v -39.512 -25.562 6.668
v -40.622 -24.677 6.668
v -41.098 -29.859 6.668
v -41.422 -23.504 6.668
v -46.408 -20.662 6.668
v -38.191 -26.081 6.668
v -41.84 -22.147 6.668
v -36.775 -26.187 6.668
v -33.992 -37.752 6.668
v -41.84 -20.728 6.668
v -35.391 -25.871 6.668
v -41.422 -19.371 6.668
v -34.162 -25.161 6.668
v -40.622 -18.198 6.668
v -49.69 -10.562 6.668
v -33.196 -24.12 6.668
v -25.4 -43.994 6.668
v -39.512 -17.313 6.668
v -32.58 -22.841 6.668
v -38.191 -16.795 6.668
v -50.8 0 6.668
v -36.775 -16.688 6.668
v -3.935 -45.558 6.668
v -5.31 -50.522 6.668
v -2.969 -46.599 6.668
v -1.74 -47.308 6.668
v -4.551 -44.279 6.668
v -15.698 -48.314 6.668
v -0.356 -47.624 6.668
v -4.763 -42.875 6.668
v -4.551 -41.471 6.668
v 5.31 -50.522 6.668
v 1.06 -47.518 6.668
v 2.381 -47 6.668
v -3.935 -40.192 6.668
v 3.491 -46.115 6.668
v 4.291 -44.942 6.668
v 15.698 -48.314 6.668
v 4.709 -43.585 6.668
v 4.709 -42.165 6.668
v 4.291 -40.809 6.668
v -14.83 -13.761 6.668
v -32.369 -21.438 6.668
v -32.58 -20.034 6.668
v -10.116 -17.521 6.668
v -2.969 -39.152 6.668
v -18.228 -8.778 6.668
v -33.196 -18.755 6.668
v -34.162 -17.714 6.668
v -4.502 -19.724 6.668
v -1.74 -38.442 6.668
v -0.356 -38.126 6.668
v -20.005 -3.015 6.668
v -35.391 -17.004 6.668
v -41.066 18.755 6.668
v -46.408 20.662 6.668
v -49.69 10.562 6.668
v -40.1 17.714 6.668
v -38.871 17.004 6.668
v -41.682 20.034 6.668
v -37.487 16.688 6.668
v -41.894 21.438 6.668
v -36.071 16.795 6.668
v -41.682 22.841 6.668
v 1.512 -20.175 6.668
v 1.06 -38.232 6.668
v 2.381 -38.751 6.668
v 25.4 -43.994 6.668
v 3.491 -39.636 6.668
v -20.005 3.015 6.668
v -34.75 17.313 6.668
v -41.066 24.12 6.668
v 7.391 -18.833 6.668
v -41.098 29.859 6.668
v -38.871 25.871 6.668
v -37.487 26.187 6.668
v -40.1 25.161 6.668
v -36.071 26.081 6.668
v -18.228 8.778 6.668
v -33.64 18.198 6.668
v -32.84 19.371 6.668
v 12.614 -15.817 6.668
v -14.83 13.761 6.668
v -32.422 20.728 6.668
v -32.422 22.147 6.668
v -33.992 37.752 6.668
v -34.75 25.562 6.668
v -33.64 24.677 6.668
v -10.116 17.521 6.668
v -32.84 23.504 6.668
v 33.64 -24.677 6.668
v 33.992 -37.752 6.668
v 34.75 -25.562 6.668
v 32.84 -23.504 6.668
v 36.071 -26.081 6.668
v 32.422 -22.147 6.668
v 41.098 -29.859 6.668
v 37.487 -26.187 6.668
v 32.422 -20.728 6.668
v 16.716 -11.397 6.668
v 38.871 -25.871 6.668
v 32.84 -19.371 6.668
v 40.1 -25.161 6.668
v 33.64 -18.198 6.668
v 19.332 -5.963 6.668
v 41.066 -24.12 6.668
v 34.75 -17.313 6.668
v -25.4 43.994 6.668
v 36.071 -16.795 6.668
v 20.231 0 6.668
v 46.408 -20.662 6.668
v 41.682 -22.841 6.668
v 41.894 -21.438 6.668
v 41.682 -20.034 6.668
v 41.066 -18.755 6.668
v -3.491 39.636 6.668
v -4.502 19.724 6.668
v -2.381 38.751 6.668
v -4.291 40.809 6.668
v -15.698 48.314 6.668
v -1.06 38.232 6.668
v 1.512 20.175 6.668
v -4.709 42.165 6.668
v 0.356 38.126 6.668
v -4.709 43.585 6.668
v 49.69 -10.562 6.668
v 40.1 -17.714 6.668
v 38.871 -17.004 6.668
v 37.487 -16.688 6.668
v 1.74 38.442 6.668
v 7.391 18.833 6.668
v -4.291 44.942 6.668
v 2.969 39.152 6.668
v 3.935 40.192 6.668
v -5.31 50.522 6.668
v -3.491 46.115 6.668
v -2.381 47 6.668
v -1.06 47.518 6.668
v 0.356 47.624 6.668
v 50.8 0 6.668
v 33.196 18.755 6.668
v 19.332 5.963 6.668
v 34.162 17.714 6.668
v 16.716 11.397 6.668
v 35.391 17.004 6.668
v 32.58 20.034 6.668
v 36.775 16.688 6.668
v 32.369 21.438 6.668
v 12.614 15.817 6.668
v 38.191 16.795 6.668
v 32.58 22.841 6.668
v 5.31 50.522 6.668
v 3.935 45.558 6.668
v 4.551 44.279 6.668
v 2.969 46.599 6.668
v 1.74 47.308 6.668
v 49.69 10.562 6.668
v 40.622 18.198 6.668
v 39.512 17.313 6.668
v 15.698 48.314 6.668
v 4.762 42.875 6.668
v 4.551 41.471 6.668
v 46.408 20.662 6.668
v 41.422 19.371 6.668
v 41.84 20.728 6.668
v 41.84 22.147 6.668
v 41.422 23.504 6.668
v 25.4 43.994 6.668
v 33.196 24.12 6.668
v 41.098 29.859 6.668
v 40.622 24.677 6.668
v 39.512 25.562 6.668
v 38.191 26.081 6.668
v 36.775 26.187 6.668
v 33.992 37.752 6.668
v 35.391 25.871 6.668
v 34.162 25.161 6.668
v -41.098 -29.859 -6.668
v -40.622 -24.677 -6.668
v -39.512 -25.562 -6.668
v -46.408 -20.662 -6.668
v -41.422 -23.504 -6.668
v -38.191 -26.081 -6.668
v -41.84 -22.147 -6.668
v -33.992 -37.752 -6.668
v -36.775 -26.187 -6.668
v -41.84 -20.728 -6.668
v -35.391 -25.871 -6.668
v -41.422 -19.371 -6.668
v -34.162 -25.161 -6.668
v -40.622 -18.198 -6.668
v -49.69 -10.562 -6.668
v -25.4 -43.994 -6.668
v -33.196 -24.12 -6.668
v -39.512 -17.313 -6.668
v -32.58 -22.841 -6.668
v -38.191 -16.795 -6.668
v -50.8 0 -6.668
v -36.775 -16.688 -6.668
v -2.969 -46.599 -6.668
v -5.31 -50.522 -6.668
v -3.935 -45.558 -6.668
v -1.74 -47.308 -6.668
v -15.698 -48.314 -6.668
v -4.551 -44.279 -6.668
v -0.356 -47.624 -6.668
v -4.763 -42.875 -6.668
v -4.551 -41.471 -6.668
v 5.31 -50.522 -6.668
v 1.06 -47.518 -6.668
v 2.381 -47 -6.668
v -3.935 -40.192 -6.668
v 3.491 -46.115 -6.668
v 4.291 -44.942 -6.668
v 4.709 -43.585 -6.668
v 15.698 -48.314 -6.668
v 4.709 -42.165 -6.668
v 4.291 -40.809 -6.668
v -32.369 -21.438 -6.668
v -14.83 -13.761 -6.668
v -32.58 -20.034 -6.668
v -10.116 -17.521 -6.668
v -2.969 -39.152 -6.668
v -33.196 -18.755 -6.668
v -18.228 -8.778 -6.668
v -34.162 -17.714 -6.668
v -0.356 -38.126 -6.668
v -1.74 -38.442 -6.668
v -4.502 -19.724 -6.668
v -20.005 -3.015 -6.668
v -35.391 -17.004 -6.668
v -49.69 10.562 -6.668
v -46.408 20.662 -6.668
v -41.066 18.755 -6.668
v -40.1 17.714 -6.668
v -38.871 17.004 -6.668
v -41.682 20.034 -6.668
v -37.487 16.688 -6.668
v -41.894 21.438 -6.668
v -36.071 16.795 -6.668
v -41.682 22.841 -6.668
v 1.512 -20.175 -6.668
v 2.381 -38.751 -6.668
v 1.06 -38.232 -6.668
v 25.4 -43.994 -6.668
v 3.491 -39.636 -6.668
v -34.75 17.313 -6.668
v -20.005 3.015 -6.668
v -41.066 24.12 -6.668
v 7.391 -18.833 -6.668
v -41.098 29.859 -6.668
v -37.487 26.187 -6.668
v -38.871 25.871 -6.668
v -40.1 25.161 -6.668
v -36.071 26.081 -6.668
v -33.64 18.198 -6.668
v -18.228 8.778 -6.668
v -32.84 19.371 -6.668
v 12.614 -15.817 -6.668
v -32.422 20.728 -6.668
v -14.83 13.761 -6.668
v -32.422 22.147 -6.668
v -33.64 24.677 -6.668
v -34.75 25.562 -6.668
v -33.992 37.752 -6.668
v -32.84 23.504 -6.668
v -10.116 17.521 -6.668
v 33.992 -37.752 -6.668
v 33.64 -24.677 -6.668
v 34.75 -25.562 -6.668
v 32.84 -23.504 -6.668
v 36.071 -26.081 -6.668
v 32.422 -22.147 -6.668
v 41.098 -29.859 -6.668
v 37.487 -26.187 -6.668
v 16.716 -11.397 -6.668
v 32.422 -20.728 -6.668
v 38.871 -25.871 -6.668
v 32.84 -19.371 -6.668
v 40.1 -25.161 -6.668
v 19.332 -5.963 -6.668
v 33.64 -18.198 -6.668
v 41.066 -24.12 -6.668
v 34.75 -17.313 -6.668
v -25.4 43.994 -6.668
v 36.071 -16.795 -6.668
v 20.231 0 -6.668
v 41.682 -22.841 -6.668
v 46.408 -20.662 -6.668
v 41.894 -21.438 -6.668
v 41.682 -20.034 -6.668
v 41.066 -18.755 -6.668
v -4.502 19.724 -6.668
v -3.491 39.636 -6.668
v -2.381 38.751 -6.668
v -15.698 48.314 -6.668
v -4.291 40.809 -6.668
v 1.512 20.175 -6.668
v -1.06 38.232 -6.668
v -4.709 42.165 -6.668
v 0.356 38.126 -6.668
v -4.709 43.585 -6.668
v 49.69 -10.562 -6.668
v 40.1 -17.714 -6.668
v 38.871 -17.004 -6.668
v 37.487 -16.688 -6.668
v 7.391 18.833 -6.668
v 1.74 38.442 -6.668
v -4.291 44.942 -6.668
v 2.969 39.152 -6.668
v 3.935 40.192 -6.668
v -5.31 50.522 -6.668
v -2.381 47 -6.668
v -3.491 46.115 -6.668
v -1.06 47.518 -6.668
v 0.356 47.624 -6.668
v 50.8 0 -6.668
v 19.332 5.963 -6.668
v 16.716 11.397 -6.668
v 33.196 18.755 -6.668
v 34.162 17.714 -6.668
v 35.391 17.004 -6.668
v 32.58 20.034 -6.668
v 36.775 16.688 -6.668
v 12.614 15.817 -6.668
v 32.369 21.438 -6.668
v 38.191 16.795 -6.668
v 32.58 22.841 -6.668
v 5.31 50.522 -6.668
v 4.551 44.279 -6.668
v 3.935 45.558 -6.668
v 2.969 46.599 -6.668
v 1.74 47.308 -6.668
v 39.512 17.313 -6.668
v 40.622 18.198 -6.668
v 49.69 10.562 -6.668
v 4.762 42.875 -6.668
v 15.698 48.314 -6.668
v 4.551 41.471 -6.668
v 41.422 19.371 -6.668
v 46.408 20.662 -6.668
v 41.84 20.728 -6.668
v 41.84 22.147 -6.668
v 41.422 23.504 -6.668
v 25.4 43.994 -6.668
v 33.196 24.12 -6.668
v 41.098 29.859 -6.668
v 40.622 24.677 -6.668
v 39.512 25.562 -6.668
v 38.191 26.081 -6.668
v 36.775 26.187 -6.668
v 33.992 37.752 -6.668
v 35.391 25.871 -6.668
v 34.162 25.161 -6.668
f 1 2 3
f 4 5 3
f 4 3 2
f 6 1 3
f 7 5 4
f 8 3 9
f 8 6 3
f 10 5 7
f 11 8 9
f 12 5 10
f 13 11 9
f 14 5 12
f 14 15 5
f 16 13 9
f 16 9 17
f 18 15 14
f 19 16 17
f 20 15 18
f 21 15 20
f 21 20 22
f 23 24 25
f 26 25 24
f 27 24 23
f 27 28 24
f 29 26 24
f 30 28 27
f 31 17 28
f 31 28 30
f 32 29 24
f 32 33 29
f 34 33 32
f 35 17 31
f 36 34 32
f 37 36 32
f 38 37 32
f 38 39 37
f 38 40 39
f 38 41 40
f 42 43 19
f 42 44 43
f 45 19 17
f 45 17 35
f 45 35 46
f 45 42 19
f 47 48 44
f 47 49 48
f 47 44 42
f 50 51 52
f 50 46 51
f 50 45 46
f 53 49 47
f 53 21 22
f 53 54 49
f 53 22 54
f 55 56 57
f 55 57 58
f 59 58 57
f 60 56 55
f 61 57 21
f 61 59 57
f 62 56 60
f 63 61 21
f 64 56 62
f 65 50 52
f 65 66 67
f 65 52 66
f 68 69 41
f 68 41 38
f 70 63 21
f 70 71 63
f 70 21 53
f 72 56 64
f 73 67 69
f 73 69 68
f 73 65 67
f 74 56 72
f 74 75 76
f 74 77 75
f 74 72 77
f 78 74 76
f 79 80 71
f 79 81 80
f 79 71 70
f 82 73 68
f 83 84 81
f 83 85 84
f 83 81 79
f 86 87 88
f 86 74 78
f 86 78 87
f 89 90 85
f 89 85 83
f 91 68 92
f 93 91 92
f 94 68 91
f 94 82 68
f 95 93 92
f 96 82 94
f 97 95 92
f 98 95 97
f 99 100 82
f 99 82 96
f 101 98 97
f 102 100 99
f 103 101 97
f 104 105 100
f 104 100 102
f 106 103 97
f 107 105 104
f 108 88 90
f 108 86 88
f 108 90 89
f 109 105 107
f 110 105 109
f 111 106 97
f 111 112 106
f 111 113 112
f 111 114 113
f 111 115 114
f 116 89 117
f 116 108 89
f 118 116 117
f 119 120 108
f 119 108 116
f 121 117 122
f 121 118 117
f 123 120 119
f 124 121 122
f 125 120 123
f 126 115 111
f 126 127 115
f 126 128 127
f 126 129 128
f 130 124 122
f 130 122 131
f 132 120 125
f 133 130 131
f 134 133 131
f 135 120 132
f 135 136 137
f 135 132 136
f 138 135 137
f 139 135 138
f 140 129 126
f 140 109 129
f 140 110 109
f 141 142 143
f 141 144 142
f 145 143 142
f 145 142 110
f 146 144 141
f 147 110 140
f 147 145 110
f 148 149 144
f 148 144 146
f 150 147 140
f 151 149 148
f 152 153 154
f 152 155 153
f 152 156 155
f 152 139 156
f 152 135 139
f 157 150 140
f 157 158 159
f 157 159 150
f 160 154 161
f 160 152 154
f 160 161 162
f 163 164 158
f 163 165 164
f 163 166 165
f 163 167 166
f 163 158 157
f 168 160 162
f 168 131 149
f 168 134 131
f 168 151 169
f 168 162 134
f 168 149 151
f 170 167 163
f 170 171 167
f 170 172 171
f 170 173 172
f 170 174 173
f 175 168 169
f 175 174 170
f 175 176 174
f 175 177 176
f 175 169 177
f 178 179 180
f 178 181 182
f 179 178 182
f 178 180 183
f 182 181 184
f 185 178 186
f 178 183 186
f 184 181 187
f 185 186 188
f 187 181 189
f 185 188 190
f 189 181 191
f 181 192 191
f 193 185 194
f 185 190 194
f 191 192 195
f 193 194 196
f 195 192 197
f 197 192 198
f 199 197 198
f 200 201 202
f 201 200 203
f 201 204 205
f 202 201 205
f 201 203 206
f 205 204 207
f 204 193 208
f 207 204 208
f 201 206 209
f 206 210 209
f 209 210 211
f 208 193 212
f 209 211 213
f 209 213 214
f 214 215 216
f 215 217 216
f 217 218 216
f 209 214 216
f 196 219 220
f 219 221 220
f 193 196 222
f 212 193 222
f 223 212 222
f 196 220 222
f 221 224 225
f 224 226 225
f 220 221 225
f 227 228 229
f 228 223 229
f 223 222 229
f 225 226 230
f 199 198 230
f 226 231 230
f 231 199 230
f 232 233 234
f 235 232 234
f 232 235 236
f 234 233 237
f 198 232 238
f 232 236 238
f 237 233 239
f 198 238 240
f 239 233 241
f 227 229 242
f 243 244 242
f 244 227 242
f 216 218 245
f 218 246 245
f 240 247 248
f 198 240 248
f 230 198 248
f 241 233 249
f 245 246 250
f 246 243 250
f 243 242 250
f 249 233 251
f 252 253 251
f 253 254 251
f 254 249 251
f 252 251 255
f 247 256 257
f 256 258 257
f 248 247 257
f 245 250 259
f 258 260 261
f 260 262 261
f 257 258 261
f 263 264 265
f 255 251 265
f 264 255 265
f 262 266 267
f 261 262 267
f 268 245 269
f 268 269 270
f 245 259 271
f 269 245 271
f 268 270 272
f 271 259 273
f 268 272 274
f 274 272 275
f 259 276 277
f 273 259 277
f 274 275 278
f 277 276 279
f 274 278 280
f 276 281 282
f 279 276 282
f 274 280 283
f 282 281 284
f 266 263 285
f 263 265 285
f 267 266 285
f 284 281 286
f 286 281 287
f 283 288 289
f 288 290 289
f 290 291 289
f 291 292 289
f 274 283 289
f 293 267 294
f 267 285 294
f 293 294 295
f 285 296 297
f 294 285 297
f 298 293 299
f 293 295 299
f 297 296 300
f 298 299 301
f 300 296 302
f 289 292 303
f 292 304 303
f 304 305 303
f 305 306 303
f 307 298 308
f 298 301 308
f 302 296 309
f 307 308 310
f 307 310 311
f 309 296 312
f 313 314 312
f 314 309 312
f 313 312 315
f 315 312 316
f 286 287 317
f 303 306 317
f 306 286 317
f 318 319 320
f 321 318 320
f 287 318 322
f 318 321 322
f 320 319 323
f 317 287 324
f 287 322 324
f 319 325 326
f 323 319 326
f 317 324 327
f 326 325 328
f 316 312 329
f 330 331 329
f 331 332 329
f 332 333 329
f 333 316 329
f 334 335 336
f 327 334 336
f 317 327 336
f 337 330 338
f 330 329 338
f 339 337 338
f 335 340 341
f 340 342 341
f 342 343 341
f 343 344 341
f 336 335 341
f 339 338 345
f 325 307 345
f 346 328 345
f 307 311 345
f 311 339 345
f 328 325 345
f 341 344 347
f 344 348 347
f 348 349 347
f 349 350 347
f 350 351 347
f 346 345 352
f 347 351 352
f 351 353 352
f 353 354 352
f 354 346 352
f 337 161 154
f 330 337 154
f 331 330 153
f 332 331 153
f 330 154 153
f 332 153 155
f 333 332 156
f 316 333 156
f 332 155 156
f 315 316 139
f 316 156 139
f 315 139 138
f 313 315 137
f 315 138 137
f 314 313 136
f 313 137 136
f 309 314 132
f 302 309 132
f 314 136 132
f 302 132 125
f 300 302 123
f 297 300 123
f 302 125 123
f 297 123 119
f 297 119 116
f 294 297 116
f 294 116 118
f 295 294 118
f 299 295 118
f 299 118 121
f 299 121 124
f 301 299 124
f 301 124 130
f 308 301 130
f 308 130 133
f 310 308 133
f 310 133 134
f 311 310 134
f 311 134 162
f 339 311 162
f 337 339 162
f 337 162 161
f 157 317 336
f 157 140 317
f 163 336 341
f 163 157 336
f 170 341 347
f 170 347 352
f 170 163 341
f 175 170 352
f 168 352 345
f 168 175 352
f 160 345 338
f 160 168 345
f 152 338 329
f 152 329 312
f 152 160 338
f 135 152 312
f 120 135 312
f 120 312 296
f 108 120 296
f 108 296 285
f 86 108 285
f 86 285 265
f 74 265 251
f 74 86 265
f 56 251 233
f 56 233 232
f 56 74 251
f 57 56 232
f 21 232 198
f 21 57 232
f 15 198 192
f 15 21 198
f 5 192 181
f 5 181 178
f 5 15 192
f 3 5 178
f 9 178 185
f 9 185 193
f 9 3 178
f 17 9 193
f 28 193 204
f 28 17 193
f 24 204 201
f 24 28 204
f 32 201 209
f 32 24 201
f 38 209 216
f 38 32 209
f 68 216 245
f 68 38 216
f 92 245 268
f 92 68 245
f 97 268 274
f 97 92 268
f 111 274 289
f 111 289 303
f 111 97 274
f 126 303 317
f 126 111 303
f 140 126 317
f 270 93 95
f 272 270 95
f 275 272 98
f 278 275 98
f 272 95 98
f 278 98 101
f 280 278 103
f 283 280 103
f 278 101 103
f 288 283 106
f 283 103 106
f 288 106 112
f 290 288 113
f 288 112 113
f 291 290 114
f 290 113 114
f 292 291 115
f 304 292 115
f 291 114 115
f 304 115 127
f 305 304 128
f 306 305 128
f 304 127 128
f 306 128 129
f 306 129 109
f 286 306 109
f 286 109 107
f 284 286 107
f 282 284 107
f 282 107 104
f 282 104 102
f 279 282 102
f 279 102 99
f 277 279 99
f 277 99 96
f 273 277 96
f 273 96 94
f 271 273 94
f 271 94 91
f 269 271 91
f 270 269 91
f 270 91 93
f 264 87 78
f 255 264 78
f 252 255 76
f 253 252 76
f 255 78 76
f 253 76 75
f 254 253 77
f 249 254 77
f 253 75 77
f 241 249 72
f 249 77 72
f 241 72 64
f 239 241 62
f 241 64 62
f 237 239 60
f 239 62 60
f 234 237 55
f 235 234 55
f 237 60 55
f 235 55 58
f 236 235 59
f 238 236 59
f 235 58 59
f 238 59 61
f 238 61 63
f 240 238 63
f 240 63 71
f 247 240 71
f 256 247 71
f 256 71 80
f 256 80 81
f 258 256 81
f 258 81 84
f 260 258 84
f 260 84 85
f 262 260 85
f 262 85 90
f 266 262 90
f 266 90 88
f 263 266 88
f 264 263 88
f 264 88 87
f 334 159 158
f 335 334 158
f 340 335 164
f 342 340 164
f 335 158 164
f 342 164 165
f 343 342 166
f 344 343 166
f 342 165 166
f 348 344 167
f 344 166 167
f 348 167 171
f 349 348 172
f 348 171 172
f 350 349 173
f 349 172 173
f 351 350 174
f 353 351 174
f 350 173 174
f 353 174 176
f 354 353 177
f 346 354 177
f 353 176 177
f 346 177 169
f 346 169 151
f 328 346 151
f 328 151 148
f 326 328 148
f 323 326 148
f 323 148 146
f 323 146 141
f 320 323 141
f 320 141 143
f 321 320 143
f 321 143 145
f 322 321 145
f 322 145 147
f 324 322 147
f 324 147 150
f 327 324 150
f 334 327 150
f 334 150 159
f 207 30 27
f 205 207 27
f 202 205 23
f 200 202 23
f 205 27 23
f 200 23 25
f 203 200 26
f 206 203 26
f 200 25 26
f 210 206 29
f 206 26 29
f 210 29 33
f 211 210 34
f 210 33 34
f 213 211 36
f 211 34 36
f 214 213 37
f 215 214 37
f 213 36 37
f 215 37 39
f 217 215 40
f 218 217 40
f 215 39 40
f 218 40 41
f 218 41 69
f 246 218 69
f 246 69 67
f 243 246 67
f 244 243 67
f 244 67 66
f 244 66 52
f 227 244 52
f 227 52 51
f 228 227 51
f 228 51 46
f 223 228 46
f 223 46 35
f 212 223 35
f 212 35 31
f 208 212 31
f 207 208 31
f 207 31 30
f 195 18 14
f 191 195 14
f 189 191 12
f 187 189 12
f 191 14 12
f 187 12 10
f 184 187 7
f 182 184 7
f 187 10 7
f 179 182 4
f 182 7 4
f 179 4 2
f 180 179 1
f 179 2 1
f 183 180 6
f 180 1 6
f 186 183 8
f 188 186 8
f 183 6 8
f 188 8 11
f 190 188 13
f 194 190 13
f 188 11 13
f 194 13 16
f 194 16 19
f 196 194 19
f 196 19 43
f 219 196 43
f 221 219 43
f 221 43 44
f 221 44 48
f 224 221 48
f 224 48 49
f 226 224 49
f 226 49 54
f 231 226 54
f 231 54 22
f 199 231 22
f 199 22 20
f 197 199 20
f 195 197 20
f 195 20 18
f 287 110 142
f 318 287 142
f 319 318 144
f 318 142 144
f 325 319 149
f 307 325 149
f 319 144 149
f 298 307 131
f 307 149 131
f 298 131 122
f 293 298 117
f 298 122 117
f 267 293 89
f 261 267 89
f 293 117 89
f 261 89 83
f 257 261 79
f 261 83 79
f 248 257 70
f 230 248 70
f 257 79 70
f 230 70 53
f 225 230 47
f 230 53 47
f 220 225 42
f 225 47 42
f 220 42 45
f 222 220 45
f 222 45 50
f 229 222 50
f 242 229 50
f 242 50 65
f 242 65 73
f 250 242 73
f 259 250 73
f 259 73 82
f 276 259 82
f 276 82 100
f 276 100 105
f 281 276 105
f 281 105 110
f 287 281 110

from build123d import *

# Parameters (mm, degrees)
SKETCH1_R           = 50.8
BOSS_EXTRUDE1_DEPTH = 6.6675
SKETCH2_R           = 20.2311
CUT_EXTRUDE1_DEPTH  = 74.06916056
SKETCH3_R           = 4.7625
CUT_EXTRUDE2_DEPTH  = 74.06916056
CIRPATTERN1_COUNT   = 6


with BuildPart() as part:
    # Sketch1 → Boss-Extrude1 (new, symmetric)
    with BuildSketch(Plane.XY):
        Circle(SKETCH1_R)
    extrude(amount=BOSS_EXTRUDE1_DEPTH, both=True)

    # Sketch2 → Cut-Extrude1 (cut, through all)
    with BuildSketch(Plane.XY.offset(6.6675)):
        Circle(SKETCH2_R)
    extrude(amount=-CUT_EXTRUDE1_DEPTH, mode=Mode.SUBTRACT)

    # Sketch3 → Cut-Extrude2 (cut, through all)
    with BuildSketch(Plane.XY.offset(6.6675)):
        with Locations((0, 42.8752)):
            Circle(SKETCH3_R)
    cut_extrude2 = extrude(amount=-CUT_EXTRUDE2_DEPTH, mode=Mode.SUBTRACT)

    # CirPattern1: Cut-Extrude2 ×6 about axis
    cirpattern1_axis = Axis((0, 0, -88.99), (0, 0, 1))
    for i in range(1, CIRPATTERN1_COUNT):
        add(cut_extrude2.rotate(cirpattern1_axis, i * 360 / CIRPATTERN1_COUNT), mode=Mode.SUBTRACT)


solid = part.part
